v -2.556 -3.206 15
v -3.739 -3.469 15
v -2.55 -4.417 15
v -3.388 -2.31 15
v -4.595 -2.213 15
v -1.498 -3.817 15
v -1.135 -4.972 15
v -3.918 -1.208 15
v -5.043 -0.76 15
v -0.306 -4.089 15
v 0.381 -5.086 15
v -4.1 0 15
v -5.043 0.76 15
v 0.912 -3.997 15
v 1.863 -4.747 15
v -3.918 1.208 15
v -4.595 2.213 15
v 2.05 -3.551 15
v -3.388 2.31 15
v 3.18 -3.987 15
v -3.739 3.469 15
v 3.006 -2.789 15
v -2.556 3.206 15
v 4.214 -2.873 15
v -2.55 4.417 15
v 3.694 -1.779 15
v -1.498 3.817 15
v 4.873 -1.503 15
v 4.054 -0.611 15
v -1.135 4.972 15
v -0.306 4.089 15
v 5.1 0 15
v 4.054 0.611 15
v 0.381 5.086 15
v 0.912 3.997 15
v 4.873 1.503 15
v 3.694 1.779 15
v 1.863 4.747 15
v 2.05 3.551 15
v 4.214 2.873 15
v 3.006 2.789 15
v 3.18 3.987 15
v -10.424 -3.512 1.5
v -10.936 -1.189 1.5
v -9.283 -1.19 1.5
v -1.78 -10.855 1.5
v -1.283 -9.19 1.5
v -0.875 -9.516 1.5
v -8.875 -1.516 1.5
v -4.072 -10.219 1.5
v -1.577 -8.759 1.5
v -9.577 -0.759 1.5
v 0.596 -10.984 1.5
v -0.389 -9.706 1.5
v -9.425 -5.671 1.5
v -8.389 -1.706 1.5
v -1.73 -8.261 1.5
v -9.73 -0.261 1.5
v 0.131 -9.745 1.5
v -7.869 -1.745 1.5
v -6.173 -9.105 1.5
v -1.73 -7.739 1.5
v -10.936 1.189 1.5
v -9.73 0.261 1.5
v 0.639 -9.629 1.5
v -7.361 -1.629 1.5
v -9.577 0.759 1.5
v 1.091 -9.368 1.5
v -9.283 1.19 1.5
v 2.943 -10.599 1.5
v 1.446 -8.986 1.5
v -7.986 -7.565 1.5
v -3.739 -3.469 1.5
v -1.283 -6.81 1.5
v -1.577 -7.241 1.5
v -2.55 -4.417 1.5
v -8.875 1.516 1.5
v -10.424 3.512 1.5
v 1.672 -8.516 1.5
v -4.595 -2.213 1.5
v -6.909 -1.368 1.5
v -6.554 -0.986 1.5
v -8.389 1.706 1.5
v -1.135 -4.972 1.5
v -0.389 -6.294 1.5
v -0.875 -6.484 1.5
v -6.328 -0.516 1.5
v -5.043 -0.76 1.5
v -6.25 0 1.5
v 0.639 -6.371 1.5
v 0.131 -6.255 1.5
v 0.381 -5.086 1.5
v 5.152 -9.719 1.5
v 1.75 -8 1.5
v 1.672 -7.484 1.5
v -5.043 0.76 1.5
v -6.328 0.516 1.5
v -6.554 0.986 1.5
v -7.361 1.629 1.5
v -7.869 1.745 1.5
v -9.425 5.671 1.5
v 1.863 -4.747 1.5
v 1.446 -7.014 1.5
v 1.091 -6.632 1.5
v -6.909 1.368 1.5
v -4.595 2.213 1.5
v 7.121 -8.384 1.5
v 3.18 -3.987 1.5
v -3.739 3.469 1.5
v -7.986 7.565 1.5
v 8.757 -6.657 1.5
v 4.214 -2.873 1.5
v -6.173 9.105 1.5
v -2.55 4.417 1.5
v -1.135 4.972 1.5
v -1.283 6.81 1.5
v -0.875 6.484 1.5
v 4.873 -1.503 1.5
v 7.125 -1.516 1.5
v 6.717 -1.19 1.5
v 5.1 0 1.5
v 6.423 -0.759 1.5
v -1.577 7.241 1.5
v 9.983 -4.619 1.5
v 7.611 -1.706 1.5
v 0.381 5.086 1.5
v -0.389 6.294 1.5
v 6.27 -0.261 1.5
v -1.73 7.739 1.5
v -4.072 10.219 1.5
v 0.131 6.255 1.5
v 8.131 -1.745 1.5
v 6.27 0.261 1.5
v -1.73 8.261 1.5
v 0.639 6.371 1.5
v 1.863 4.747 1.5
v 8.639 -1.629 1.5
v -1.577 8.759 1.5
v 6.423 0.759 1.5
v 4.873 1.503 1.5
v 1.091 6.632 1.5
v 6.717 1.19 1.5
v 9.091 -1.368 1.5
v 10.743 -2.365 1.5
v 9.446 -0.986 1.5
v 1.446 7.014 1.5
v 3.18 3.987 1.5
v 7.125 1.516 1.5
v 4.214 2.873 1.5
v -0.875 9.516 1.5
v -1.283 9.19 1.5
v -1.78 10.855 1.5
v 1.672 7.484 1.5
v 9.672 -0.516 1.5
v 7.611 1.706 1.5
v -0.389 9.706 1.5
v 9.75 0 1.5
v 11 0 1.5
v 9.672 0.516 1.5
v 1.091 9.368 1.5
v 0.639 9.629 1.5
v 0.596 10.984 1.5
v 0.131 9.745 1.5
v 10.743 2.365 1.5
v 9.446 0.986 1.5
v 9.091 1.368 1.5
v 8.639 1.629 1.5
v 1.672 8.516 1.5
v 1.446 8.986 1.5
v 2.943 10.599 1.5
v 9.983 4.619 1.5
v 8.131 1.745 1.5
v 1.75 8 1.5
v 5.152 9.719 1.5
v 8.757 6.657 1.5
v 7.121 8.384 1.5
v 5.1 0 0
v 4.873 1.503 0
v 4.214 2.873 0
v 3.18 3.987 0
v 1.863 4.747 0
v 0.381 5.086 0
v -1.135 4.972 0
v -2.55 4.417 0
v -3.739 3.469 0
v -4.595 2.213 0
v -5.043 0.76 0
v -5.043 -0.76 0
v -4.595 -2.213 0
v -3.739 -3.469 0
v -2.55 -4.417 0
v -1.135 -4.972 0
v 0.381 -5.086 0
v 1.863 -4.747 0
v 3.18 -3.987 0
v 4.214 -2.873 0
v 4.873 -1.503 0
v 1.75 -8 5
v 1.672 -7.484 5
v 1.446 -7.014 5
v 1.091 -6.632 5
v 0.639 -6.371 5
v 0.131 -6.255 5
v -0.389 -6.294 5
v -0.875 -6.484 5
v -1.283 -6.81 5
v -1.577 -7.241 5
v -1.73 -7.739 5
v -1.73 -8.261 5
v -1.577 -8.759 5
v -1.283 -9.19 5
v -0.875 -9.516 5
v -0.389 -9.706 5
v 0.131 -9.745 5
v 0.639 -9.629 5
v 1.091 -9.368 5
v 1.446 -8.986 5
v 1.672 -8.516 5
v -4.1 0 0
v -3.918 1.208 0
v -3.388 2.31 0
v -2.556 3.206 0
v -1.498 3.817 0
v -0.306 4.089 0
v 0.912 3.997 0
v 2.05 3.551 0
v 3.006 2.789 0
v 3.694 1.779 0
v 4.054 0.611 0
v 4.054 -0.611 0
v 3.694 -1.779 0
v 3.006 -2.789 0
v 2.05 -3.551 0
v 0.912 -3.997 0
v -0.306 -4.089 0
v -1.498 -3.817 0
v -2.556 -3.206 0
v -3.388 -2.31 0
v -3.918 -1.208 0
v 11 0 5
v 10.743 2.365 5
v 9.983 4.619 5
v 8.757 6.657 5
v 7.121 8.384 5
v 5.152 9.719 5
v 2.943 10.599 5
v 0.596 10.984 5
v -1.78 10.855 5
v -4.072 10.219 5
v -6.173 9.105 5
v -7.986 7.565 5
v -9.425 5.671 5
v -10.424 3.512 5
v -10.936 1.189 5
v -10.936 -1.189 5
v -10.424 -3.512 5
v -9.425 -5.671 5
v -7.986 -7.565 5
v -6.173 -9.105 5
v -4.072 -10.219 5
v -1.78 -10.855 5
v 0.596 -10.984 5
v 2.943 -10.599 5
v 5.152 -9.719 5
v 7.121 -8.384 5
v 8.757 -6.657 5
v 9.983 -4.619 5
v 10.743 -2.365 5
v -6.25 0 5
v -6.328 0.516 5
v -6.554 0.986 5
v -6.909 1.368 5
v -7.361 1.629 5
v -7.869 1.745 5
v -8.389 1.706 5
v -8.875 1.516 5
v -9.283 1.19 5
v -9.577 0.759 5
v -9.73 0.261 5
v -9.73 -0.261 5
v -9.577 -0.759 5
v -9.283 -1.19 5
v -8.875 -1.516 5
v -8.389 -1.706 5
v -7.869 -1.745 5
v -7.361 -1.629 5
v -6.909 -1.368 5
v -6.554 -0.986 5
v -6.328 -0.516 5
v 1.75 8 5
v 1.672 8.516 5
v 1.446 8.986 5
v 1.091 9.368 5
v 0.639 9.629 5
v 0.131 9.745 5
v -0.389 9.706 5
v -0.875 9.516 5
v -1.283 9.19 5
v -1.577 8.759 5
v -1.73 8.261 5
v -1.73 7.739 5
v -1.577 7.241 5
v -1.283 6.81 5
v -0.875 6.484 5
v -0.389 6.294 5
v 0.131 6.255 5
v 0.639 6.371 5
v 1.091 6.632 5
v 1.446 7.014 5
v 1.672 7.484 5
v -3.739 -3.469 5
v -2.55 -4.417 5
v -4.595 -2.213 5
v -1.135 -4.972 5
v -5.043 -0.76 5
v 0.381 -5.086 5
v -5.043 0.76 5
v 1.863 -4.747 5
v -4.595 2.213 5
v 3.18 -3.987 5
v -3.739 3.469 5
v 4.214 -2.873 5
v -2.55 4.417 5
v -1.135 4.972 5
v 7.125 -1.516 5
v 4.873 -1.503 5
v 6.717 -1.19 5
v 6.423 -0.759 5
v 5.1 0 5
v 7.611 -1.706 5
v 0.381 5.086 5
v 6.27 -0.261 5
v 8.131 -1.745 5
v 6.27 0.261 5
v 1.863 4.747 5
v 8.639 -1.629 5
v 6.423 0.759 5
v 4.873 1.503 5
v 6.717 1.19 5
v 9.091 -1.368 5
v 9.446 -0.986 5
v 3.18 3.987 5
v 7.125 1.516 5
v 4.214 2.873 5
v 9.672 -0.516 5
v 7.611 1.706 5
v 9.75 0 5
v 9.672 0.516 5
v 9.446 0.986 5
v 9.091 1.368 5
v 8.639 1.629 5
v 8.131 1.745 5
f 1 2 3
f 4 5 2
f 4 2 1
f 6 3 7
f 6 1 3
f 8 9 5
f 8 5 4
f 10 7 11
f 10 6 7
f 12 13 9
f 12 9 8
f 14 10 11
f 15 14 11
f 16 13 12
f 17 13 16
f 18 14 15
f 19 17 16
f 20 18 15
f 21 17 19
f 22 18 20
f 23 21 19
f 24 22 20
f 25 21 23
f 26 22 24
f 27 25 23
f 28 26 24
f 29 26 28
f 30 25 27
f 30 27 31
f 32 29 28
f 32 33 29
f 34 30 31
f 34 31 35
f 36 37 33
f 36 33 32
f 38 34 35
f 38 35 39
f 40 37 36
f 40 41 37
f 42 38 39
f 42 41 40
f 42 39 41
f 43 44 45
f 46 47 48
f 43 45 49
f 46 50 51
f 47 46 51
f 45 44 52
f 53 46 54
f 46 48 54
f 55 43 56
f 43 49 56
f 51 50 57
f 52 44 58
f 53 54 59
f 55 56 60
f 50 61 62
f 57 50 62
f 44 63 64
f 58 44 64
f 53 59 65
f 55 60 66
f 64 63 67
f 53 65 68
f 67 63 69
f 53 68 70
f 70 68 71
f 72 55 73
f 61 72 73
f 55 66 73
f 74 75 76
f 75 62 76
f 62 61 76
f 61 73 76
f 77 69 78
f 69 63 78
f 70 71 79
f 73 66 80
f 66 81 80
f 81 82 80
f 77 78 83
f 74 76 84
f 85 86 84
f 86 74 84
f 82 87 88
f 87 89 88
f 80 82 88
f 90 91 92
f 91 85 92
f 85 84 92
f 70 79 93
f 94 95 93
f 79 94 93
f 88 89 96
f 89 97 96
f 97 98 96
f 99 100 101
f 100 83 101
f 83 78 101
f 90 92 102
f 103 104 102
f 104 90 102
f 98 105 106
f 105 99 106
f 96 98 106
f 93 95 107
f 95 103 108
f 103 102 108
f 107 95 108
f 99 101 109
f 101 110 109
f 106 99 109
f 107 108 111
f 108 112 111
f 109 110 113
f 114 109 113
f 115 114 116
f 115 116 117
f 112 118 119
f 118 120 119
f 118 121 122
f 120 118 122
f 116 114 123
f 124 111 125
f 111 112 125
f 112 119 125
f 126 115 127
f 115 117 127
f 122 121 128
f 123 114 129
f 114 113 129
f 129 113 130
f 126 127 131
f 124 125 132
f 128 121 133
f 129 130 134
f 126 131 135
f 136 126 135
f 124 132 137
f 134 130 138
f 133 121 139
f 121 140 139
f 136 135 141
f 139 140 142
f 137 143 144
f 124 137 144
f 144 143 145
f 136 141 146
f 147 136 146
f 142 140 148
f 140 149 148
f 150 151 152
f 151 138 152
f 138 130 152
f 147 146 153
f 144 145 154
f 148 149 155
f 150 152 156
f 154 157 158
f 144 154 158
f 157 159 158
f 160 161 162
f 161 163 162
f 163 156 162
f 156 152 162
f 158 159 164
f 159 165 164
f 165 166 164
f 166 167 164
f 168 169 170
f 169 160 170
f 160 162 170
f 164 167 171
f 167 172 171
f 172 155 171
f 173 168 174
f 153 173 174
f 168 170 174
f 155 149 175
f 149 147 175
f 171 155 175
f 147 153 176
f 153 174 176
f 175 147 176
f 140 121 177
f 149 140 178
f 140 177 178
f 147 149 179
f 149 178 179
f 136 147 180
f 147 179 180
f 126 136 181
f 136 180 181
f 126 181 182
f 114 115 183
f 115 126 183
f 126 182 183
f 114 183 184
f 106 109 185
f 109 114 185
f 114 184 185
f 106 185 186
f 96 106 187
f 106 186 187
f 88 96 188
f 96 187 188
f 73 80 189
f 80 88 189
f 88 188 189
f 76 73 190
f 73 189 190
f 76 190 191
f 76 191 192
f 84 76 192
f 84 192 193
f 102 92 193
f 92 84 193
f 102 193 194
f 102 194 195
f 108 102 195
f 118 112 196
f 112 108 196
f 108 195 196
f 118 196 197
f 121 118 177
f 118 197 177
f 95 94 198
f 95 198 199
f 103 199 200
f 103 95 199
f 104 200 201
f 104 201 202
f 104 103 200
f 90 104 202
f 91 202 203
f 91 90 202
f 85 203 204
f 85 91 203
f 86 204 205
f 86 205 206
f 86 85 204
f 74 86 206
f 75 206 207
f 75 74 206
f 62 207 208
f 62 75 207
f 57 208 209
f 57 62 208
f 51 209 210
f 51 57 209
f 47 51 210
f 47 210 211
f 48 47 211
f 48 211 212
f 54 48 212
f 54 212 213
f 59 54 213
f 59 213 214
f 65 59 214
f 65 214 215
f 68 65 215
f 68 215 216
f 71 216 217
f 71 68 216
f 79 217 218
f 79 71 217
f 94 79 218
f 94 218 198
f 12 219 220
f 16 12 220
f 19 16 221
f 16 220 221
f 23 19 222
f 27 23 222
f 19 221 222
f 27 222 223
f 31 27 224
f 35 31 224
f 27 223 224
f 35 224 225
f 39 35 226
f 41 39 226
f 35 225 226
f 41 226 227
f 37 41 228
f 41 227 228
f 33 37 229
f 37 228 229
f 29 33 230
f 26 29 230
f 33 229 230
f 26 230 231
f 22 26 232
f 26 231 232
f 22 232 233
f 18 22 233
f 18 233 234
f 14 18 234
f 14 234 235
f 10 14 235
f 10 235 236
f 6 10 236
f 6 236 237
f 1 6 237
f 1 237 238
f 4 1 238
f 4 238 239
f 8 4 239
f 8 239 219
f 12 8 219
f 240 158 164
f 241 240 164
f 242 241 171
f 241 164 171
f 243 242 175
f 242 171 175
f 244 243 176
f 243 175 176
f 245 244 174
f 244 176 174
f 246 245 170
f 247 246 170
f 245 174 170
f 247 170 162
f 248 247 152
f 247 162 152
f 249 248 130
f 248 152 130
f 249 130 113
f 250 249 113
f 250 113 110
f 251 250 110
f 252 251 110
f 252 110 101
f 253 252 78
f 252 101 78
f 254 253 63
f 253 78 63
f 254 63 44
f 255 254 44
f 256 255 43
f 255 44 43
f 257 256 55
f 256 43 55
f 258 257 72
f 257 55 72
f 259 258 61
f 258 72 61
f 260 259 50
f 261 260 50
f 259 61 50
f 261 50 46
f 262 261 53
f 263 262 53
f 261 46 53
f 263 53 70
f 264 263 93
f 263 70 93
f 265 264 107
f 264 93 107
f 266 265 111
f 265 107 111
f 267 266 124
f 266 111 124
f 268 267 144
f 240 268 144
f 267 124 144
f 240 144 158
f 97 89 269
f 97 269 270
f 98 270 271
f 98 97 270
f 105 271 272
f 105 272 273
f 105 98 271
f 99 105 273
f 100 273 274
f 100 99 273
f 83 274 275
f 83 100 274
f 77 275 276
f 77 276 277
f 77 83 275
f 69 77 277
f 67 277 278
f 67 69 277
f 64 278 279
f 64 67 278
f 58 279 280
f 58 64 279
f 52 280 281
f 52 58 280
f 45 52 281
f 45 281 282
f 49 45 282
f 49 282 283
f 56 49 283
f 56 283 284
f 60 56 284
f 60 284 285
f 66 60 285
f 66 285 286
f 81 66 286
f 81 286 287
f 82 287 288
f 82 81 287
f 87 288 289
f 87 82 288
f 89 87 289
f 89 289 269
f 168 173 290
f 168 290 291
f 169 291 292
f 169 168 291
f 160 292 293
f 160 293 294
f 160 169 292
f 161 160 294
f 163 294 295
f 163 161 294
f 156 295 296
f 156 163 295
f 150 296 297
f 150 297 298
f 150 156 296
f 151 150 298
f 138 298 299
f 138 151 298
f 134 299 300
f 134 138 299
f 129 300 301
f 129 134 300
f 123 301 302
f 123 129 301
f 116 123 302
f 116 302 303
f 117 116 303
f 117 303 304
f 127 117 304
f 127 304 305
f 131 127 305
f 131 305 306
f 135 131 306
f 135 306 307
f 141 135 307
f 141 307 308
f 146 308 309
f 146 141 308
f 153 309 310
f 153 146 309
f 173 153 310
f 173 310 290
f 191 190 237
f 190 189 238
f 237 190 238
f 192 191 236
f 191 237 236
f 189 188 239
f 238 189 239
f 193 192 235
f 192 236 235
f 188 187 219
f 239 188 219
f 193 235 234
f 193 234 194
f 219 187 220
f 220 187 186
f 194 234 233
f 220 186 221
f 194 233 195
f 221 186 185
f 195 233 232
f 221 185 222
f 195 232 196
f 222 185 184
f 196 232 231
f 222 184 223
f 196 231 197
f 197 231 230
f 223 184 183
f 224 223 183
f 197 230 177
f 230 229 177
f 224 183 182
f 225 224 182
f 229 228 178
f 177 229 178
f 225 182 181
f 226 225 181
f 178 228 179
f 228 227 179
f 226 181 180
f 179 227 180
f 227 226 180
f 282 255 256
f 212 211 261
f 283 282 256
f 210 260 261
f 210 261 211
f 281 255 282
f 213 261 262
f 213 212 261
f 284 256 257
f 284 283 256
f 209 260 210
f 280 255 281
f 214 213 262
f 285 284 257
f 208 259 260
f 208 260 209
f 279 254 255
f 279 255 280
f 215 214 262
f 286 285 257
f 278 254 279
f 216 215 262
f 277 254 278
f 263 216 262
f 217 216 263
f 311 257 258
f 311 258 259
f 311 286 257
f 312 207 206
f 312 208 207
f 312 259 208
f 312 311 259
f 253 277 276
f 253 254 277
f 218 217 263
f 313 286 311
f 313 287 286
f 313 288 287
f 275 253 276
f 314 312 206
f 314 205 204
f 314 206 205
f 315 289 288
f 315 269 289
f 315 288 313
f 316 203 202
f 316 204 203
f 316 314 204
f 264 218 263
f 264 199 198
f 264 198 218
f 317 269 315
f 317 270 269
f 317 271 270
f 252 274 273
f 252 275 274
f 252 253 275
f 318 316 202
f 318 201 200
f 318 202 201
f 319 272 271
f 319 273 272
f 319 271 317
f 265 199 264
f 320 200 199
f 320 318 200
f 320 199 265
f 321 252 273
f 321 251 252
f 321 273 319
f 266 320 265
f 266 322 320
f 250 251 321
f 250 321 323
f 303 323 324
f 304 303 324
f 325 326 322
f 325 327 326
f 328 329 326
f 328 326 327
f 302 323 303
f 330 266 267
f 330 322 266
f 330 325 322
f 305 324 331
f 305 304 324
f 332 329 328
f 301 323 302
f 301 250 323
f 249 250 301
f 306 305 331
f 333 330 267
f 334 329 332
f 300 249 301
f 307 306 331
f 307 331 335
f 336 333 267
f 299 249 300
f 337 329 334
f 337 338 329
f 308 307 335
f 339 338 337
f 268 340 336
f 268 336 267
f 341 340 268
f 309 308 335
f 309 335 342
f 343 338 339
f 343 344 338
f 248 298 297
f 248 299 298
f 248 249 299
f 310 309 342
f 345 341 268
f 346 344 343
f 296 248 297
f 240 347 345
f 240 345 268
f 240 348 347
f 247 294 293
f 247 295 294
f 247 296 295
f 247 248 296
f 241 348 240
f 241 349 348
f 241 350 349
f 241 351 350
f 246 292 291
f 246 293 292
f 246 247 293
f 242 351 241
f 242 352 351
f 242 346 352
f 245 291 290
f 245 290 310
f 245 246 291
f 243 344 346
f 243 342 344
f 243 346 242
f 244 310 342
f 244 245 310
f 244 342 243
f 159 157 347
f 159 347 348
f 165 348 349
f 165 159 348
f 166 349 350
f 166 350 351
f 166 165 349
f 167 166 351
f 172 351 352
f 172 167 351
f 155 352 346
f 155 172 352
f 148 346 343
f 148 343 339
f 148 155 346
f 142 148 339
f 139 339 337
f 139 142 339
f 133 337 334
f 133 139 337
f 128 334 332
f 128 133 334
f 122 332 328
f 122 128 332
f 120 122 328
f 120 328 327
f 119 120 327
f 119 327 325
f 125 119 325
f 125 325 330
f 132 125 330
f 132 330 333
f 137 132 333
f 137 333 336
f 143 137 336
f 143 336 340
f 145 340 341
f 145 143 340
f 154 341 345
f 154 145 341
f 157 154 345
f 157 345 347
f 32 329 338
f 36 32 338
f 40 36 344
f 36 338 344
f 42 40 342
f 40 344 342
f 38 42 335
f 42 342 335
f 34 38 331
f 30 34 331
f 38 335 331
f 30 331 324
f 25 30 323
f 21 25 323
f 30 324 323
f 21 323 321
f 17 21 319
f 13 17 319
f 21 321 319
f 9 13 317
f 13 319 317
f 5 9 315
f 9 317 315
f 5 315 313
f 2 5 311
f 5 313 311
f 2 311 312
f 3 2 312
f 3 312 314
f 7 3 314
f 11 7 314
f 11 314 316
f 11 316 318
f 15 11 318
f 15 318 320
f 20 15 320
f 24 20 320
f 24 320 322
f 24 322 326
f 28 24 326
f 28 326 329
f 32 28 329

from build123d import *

# Parameters (mm, degrees)
SKETCH1_R           = 5.1
BOSS_EXTRUDE1_DEPTH = 15
SKETCH2_R           = 11
SKETCH2_R_2         = 1.75
BOSS_EXTRUDE2_DEPTH = 3.5
SKETCH3_R           = 4.1
CUT_EXTRUDE1_DEPTH  = 22.610182785


with BuildPart() as part:
    # Sketch1 → Boss-Extrude1 (new body)
    with BuildSketch(Plane.XY):
        Circle(SKETCH1_R)
    extrude(amount=BOSS_EXTRUDE1_DEPTH)

    # Sketch2 → Boss-Extrude2 (add)
    with BuildSketch(Plane.XY.offset(1.5)):
        Circle(SKETCH2_R)
        with Locations((0, 8)):
            Circle(SKETCH2_R_2, mode=Mode.SUBTRACT)
        with Locations((8, 0)):
            Circle(SKETCH2_R_2, mode=Mode.SUBTRACT)
        with Locations((0, -8)):
            Circle(SKETCH2_R_2, mode=Mode.SUBTRACT)
        with Locations((-8, 0)):
            Circle(SKETCH2_R_2, mode=Mode.SUBTRACT)
    extrude(amount=BOSS_EXTRUDE2_DEPTH)

    # Sketch3 → Cut-Extrude1 (cut, through all)
    with BuildSketch(Plane(origin=(0, 0, 0), x_dir=(-1, 0, 0), z_dir=(0, 0, -1))):
        Circle(SKETCH3_R)
    extrude(amount=-CUT_EXTRUDE1_DEPTH, mode=Mode.SUBTRACT)


solid = part.part
